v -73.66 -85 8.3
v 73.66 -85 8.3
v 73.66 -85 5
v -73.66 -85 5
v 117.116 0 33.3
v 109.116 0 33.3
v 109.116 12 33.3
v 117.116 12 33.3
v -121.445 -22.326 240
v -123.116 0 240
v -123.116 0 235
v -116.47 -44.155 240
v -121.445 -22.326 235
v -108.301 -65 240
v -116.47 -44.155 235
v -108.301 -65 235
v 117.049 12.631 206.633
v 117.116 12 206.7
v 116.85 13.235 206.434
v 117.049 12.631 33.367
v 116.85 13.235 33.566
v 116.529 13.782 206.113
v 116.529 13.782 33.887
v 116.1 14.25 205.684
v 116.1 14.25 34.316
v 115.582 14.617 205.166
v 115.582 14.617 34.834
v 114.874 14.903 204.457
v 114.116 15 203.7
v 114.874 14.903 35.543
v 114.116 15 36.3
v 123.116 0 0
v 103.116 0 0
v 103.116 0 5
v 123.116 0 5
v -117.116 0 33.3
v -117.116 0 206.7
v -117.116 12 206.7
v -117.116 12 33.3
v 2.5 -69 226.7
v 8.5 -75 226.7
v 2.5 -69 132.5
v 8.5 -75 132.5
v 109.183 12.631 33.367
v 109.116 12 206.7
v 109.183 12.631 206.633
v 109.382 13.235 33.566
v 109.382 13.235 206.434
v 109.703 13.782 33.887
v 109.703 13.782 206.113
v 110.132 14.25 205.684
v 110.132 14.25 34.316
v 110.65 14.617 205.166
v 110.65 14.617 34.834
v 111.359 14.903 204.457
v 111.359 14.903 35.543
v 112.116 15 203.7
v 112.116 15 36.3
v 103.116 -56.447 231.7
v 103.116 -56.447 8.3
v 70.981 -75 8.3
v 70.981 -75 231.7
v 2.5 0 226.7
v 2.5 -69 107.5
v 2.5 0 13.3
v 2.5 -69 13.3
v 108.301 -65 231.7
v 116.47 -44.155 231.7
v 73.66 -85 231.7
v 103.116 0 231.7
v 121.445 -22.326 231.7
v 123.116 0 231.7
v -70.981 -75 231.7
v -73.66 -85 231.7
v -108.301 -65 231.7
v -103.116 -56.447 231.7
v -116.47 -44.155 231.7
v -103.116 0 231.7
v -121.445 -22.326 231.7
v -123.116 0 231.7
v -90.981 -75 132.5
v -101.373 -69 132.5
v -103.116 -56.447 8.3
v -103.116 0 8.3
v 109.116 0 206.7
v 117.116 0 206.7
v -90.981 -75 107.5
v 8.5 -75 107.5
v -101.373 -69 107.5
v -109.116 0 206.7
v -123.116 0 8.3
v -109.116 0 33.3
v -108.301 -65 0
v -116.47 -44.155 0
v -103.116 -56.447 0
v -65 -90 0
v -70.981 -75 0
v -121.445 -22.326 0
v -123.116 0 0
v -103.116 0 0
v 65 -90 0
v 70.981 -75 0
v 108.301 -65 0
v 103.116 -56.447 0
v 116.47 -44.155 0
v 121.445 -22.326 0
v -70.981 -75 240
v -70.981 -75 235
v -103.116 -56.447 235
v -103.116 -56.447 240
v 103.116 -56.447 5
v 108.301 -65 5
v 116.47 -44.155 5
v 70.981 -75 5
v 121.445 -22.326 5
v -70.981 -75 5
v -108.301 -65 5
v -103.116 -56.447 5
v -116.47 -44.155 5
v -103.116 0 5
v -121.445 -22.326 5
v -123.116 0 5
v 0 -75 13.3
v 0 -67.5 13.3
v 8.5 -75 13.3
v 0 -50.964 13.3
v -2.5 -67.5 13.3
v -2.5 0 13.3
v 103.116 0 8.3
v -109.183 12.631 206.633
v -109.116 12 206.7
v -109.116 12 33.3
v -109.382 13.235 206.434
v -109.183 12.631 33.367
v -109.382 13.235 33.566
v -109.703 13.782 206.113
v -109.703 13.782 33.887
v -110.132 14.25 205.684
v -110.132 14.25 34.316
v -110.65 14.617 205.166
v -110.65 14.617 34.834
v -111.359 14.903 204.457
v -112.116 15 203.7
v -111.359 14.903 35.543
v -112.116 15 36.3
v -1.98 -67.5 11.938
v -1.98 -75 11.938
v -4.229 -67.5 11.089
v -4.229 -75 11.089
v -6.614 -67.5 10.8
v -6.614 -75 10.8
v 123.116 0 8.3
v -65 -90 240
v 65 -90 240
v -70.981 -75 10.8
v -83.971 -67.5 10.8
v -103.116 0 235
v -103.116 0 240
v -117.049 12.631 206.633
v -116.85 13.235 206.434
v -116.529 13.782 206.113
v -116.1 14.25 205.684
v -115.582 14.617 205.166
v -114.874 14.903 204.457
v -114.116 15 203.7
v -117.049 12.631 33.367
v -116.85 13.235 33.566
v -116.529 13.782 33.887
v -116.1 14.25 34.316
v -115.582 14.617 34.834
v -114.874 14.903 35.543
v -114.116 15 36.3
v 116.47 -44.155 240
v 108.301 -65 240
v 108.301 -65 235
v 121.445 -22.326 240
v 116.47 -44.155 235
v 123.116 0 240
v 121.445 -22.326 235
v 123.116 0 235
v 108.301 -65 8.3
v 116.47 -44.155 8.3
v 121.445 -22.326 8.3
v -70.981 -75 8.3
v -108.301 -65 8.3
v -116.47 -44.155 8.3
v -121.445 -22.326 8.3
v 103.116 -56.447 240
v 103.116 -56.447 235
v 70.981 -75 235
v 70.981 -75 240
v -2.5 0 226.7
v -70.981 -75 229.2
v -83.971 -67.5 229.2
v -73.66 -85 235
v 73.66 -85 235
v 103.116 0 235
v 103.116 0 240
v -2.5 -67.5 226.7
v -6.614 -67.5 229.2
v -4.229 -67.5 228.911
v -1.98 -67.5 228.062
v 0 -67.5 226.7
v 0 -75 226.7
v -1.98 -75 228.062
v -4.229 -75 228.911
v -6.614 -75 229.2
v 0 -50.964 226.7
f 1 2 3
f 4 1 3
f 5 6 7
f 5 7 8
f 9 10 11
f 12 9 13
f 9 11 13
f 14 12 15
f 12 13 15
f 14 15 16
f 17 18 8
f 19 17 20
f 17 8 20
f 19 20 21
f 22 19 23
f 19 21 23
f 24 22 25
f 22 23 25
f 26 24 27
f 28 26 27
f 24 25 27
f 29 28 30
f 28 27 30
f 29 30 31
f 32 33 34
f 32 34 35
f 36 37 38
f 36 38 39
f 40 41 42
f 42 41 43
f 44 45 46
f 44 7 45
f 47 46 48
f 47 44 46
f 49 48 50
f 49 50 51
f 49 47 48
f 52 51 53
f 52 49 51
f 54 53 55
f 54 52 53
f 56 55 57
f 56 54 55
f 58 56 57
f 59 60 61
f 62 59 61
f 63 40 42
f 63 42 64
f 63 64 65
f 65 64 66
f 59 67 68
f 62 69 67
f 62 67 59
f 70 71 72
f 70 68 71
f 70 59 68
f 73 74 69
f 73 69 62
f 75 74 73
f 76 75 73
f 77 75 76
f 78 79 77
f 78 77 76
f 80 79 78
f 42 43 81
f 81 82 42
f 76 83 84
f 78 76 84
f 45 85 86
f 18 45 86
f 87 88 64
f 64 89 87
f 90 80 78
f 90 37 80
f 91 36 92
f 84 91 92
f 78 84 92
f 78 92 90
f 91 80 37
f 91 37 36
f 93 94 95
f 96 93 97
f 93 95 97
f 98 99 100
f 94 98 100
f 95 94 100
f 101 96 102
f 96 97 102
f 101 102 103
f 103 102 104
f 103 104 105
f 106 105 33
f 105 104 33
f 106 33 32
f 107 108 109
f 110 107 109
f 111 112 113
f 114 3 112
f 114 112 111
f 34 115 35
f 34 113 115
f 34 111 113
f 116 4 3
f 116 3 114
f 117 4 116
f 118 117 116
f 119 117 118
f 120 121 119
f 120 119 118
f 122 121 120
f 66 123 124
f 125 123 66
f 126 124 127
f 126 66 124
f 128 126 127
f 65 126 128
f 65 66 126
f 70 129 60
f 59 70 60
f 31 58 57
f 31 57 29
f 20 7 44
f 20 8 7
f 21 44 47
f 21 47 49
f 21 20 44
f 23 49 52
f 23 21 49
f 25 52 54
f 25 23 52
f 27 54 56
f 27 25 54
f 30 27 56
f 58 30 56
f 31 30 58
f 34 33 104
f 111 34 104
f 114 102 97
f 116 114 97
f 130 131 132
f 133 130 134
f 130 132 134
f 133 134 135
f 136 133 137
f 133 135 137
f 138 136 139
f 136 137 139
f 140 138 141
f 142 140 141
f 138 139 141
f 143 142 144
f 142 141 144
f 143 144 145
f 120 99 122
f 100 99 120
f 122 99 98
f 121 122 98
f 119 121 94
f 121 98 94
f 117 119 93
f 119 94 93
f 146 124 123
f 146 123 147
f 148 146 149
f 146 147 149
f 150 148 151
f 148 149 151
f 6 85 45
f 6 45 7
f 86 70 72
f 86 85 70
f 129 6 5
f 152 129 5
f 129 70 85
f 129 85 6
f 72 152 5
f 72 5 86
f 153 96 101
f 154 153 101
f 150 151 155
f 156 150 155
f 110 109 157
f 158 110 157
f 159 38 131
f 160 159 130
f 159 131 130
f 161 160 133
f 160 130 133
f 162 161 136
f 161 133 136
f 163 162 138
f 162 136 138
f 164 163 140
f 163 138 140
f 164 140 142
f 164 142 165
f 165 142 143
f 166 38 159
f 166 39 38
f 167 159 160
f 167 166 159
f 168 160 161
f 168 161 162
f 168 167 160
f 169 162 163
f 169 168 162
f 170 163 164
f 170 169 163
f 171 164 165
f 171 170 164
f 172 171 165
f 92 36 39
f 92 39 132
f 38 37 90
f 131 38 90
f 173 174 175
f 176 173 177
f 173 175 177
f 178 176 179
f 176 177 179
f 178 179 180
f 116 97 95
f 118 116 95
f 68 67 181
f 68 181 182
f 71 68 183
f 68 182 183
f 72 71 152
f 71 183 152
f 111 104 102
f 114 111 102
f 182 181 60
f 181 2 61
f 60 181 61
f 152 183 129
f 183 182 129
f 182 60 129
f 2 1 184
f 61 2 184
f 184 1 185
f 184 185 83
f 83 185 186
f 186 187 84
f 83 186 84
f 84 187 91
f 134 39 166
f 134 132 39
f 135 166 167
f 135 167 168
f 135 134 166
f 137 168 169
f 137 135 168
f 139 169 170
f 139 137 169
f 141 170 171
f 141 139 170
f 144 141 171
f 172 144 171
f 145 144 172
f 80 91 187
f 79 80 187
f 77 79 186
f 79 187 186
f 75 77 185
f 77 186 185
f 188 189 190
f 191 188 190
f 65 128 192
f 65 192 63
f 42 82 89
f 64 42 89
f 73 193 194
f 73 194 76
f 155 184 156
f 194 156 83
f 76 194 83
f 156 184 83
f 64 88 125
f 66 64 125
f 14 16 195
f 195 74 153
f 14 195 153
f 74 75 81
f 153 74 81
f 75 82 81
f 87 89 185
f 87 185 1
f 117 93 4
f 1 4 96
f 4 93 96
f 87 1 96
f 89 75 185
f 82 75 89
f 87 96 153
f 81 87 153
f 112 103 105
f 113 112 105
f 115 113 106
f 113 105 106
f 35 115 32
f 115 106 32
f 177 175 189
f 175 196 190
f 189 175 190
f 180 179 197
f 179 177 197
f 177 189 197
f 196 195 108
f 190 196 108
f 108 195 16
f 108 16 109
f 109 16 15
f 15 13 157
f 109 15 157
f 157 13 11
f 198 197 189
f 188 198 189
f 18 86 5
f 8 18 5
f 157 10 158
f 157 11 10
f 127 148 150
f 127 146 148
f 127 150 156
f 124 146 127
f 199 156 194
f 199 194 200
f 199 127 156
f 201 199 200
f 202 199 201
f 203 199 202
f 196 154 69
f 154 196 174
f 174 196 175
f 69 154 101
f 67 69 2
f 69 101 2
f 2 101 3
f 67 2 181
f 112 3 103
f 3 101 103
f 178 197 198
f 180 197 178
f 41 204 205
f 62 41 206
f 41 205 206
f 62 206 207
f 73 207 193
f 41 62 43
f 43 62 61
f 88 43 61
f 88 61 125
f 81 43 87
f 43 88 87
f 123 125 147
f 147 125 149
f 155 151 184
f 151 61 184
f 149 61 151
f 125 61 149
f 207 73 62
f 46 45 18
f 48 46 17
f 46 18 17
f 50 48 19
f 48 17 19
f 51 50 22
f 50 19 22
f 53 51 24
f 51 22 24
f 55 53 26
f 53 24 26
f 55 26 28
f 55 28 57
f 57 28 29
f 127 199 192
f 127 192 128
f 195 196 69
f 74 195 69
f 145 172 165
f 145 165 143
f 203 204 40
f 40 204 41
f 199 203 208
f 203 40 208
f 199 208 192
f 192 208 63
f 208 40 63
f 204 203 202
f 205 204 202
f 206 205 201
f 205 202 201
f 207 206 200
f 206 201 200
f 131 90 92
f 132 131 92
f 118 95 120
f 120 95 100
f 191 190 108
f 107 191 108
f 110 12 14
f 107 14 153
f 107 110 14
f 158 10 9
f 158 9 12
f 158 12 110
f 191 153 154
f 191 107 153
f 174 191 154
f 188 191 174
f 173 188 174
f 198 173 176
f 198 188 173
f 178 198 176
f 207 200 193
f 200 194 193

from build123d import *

# Parameters (mm, degrees)
BOSS_EXTRUDE1_DEPTH             = 240
CUT_EXTRUDE4_DEPTH              = 285.354710913
CUT_EXTRUDE4_DEPTH_BACK         = 285.354710913
CUT_EXTRUDE5_DEPTH              = 285.354710913
CUT_EXTRUDE5_DEPTH_BACK         = 285.354710913
SKETCH3_W                       = 3.3
SKETCH3_H                       = 170
BOSS_EXTRUDE4_REACH             = 286.355
SKETCH7_W                       = 213.4
SKETCH7_H                       = 5
BOSS_EXTRUDE4_DIRECTION_2_REACH = 286.355
CHAMFER7_SIZE                   = 6
SKETCH8_W                       = 5
SKETCH8_H                       = 213.4
BOSS_EXTRUDE5_DEPTH             = 120
CHAMFER8_SIZE                   = 6
CUT_EXTRUDE6_DEPTH              = 23
CUT_EXTRUDE6_DEPTH_BACK         = 176
SKETCH10_W                      = 25
SKETCH10_H                      = 6
BOSS_EXTRUDE6_DEPTH             = 90
FILLET1_R                       = 10
FILLET2_R                       = 10
SKETCH13_R                      = 1.2
CUT_EXTRUDE7_DEPTH              = 285.354710913
SKETCH14_R                      = 2
CUT_EXTRUDE8_DEPTH              = 47
CUT_EXTRUDE9_DEPTH              = 285.354710957
CUT_EXTRUDE9_DEPTH_BACK         = 285.354710957
SKETCH15_W                      = 272.433286574
SKETCH15_H                      = 99.158633553
SKETCH16_W                      = 8
SKETCH16_H                      = 173.4
BOSS_EXTRUDE7_DEPTH             = 15
FILLET3_R                       = 3


with BuildPart() as part:
    # Sketch1 → Boss-Extrude1 (new body)
    with BuildSketch(Plane.XY):
        with BuildLine():
            Line((-65, 90), (-108.301270189, 65))
            ThreePointArc((-108.301270189, 65), (-123.116211843, 0), (-108.301270189, -65))
            Line((-108.301270189, -65), (-65, -90))
            Line((-65, -90), (65, -90))
            Line((65, -90), (108.301270189, -65))
            ThreePointArc((108.301270189, -65), (123.116211843, 0), (108.301270189, 65))
            Line((108.301270189, 65), (65, 90))
            Line((65, 90), (-65, 90))
        make_face()
    extrude(amount=BOSS_EXTRUDE1_DEPTH)

    # Sketch2 → Cut-Extrude4 (cut, two sides: drawn at the far end of the back side and taken through both)
    with BuildSketch(Plane.XY.offset(240).offset(-CUT_EXTRUDE4_DEPTH_BACK)):
        Polygon((-70.980762114, 75), (70.980762114, 75), (103.116211843, 56.446589448), (103.116211843, -56.446589448), (70.980762114, -75), (-70.980762114, -75), (-103.116211843, -56.446589448), (-103.116211843, 56.446589448), align=None)
    extrude(amount=CUT_EXTRUDE4_DEPTH + CUT_EXTRUDE4_DEPTH_BACK, mode=Mode.SUBTRACT)

    # Sketch3 → Cut-Extrude5 (cut, two sides: drawn at the far end of the back side and taken through both)
    with BuildSketch(Plane(origin=(0, 0, 0), x_dir=(0, 0, -1), z_dir=(1, 0, 0)).offset(-CUT_EXTRUDE5_DEPTH_BACK)):
        with Locations((-233.35, 0)):
            Rectangle(SKETCH3_W, SKETCH3_H)
        with Locations((-6.65, 0)):
            Rectangle(SKETCH3_W, SKETCH3_H)
    extrude(amount=CUT_EXTRUDE5_DEPTH + CUT_EXTRUDE5_DEPTH_BACK, mode=Mode.SUBTRACT)

    # Boss-Extrude4: up to this face of the body (flat: up to its plane)
    boss_extrude4_end = Plane(part.part.faces().sort_by_distance((103.116211843, 0, 120))[0])
    # Sketch7 → Boss-Extrude4 (add, up to the picked face)
    with BuildSketch(Plane(origin=(0, 0, 0), x_dir=(0, 0, -1), z_dir=(1, 0, 0)), mode=Mode.PRIVATE) as boss_extrude4_sk1:
        with Locations((-120, 47.5)):
            Rectangle(SKETCH7_W, SKETCH7_H)
    boss_extrude4_tool1 = split(extrude(boss_extrude4_sk1.sketch, amount=BOSS_EXTRUDE4_REACH, mode=Mode.PRIVATE), bisect_by=boss_extrude4_end, keep=Keep.BOTH, mode=Mode.PRIVATE)
    add(boss_extrude4_tool1.solids().sort_by(Axis((0, 47.5, 120), (1, 0, 0)))[0])

    # Boss-Extrude4 direction 2: up to this face of the body (flat: up to its plane)
    boss_extrude4_direction_2_end = Plane(part.part.faces().sort_by_distance((-103.116211843, 0, 120))[0])
    # Sketch7 → Boss-Extrude4 direction 2 (add, up to the picked face)
    with BuildSketch(Plane(origin=(0, 0, 0), x_dir=(0, 0, -1), z_dir=(1, 0, 0)), mode=Mode.PRIVATE) as boss_extrude4_direction_2_sk1:
        with Locations((-120, 47.5)):
            Rectangle(SKETCH7_W, SKETCH7_H)
    boss_extrude4_direction_2_tool1 = split(extrude(boss_extrude4_direction_2_sk1.sketch, amount=-BOSS_EXTRUDE4_DIRECTION_2_REACH, mode=Mode.PRIVATE), bisect_by=boss_extrude4_direction_2_end, keep=Keep.BOTH, mode=Mode.PRIVATE)
    add(boss_extrude4_direction_2_tool1.solids().sort_by(Axis((0, 47.5, 120), (-1, 0, 0)))[0])

    # Chamfer7
    chamfer7_edges = [part.edges().sort_by_distance(p)[0] for p in [
        (-103.116211843, 45, 120),
        (103.116211843, 45, 120),
    ]]
    chamfer(chamfer7_edges, length=CHAMFER7_SIZE)

    # Sketch8 → Boss-Extrude5 (add)
    with BuildSketch(Plane(origin=(0, -75, 0), x_dir=(1, 0, 0), z_dir=(0, 1, 0))):
        with Locations((0, -120)):
            Rectangle(SKETCH8_W, SKETCH8_H)
    extrude(amount=BOSS_EXTRUDE5_DEPTH)

    # Chamfer8
    chamfer8_edges = [part.edges().sort_by_distance(p)[0] for p in [
        (2.5, -75, 120),
        (-2.5, -75, 120),
        (2.5, 45, 120),
        (-2.5, 45, 120),
    ]]
    chamfer(chamfer8_edges, length=CHAMFER8_SIZE)

    # Sketch10 → Cut-Extrude6 (cut, two sides: drawn at the far end of the back side and taken through both)
    with BuildSketch(Plane(origin=(0, 0, 0), x_dir=(0, 0, -1), z_dir=(1, 0, 0)).offset(-CUT_EXTRUDE6_DEPTH_BACK)):
        with Locations((-120, -72)):
            Rectangle(SKETCH10_W, SKETCH10_H)
    extrude(amount=CUT_EXTRUDE6_DEPTH + CUT_EXTRUDE6_DEPTH_BACK, mode=Mode.SUBTRACT)

    # Sketch12 → Boss-Extrude6 (add)
    with BuildSketch(Plane(origin=(0, 0, 0), x_dir=(0, 0, -1), z_dir=(1, 0, 0))):
        Polygon((-10.8, -67.5), (-229.2, -67.5), (-229.2, -75), (-132.5, -75), (-132.5, -69), (-107.5, -69), (-107.5, -75), (-10.8, -75), align=None)
    extrude(amount=-BOSS_EXTRUDE6_DEPTH)

    # Fillet1
    # the kernel refuses this fillet: 10 mm, written as the material it takes off along each edge
    with BuildSketch(Plane(origin=(0, -75, 10.8), x_dir=(-1, 0, 0), z_dir=(0, 1, 0))) as fillet1_piece_1:
        with BuildLine():
            CenterArc((6.614378278, 10), FILLET1_R, 228.590377891, 41.409622109)
            Line((0, 2.5), (-0.132287566, 2.35))
            ThreePointArc((-0.132287566, 2.35), (-0.2, 1.25), (-0.2, 0))
            Line((-0.2, 0), (0, -0.2))
            Line((0, -0.2), (6.614378278, -0.2))
            Line((6.614378278, -0.2), (6.614378278, 0))
        make_face()
    extrude(amount=24.035945694, mode=Mode.SUBTRACT)

    # Fillet2
    # the kernel refuses this fillet: 10 mm, written as the material it takes off along each edge
    with BuildSketch(Plane(origin=(0, -50.964054306, 229.2), x_dir=(0, 0, -1), z_dir=(0, -1, 0))) as fillet2_piece_1:
        with BuildLine():
            CenterArc((10, -6.614378278), FILLET2_R, 138.590377891, 41.409622109)
            Line((0, -6.614378278), (-0.2, -6.614378278))
            Line((-0.2, -6.614378278), (-0.2, 0))
            Line((-0.2, 0), (0, 0.2))
            ThreePointArc((0, 0.2), (1.25, 0.2), (2.35, 0.132287566))
            Line((2.35, 0.132287566), (2.5, 0))
        make_face()
    extrude(amount=24.035945694, mode=Mode.SUBTRACT)

    # Sketch13 → Cut-Extrude7 (cut, through all)
    with BuildSketch(Plane(origin=(0, 0, 0), x_dir=(0, 0, -1), z_dir=(1, 0, 0))):
        with Locations((-173.35, 62.5)):
            Circle(SKETCH13_R)
        with Locations((-66.65, 62.5)):
            Circle(SKETCH13_R)
    extrude(amount=-CUT_EXTRUDE7_DEPTH, mode=Mode.SUBTRACT)

    # Sketch14 → Cut-Extrude8 (cut)
    with BuildSketch(Plane(origin=(0, 50, 0), x_dir=(1, 0, 0), z_dir=(0, 1, 0))):
        with Locations(Location((-41.18, -120, 0), (0, 0, 270))):
            Circle(SKETCH14_R)
    extrude(amount=-CUT_EXTRUDE8_DEPTH, mode=Mode.SUBTRACT)

    # Sketch15 → Cut-Extrude9 (cut, two sides: drawn at the far end of the back side and taken through both)
    with BuildSketch(Plane.XY.offset(-CUT_EXTRUDE9_DEPTH_BACK)):
        with Locations((1.391256338, 49.579316777)):
            Rectangle(SKETCH15_W, SKETCH15_H)
    extrude(amount=CUT_EXTRUDE9_DEPTH + CUT_EXTRUDE9_DEPTH_BACK, mode=Mode.SUBTRACT)

    # Sketch16 → Boss-Extrude7 (add)
    with BuildSketch(Plane(origin=(0, 0, 0), x_dir=(1, 0, 0), z_dir=(0, 1, 0))):
        with Locations((-113.116211843, -120)):
            Rectangle(SKETCH16_W, SKETCH16_H)
        with Locations((113.116211843, -120)):
            Rectangle(SKETCH16_W, SKETCH16_H)
    extrude(amount=BOSS_EXTRUDE7_DEPTH)

    # Fillet3
    fillet3_edges = [part.edges().sort_by_distance(p)[0] for p in [
        (-117.116211843, 15, 120),
        (-113.116211843, 15, 206.7),
        (-109.116211843, 15, 120),
        (-113.116211843, 15, 33.3),
        (109.116211843, 15, 120),
        (113.116211843, 15, 206.7),
        (117.116211843, 15, 120),
        (113.116211843, 15, 33.3),
    ]]
    fillet(fillet3_edges, radius=FILLET3_R)


solid = part.part
